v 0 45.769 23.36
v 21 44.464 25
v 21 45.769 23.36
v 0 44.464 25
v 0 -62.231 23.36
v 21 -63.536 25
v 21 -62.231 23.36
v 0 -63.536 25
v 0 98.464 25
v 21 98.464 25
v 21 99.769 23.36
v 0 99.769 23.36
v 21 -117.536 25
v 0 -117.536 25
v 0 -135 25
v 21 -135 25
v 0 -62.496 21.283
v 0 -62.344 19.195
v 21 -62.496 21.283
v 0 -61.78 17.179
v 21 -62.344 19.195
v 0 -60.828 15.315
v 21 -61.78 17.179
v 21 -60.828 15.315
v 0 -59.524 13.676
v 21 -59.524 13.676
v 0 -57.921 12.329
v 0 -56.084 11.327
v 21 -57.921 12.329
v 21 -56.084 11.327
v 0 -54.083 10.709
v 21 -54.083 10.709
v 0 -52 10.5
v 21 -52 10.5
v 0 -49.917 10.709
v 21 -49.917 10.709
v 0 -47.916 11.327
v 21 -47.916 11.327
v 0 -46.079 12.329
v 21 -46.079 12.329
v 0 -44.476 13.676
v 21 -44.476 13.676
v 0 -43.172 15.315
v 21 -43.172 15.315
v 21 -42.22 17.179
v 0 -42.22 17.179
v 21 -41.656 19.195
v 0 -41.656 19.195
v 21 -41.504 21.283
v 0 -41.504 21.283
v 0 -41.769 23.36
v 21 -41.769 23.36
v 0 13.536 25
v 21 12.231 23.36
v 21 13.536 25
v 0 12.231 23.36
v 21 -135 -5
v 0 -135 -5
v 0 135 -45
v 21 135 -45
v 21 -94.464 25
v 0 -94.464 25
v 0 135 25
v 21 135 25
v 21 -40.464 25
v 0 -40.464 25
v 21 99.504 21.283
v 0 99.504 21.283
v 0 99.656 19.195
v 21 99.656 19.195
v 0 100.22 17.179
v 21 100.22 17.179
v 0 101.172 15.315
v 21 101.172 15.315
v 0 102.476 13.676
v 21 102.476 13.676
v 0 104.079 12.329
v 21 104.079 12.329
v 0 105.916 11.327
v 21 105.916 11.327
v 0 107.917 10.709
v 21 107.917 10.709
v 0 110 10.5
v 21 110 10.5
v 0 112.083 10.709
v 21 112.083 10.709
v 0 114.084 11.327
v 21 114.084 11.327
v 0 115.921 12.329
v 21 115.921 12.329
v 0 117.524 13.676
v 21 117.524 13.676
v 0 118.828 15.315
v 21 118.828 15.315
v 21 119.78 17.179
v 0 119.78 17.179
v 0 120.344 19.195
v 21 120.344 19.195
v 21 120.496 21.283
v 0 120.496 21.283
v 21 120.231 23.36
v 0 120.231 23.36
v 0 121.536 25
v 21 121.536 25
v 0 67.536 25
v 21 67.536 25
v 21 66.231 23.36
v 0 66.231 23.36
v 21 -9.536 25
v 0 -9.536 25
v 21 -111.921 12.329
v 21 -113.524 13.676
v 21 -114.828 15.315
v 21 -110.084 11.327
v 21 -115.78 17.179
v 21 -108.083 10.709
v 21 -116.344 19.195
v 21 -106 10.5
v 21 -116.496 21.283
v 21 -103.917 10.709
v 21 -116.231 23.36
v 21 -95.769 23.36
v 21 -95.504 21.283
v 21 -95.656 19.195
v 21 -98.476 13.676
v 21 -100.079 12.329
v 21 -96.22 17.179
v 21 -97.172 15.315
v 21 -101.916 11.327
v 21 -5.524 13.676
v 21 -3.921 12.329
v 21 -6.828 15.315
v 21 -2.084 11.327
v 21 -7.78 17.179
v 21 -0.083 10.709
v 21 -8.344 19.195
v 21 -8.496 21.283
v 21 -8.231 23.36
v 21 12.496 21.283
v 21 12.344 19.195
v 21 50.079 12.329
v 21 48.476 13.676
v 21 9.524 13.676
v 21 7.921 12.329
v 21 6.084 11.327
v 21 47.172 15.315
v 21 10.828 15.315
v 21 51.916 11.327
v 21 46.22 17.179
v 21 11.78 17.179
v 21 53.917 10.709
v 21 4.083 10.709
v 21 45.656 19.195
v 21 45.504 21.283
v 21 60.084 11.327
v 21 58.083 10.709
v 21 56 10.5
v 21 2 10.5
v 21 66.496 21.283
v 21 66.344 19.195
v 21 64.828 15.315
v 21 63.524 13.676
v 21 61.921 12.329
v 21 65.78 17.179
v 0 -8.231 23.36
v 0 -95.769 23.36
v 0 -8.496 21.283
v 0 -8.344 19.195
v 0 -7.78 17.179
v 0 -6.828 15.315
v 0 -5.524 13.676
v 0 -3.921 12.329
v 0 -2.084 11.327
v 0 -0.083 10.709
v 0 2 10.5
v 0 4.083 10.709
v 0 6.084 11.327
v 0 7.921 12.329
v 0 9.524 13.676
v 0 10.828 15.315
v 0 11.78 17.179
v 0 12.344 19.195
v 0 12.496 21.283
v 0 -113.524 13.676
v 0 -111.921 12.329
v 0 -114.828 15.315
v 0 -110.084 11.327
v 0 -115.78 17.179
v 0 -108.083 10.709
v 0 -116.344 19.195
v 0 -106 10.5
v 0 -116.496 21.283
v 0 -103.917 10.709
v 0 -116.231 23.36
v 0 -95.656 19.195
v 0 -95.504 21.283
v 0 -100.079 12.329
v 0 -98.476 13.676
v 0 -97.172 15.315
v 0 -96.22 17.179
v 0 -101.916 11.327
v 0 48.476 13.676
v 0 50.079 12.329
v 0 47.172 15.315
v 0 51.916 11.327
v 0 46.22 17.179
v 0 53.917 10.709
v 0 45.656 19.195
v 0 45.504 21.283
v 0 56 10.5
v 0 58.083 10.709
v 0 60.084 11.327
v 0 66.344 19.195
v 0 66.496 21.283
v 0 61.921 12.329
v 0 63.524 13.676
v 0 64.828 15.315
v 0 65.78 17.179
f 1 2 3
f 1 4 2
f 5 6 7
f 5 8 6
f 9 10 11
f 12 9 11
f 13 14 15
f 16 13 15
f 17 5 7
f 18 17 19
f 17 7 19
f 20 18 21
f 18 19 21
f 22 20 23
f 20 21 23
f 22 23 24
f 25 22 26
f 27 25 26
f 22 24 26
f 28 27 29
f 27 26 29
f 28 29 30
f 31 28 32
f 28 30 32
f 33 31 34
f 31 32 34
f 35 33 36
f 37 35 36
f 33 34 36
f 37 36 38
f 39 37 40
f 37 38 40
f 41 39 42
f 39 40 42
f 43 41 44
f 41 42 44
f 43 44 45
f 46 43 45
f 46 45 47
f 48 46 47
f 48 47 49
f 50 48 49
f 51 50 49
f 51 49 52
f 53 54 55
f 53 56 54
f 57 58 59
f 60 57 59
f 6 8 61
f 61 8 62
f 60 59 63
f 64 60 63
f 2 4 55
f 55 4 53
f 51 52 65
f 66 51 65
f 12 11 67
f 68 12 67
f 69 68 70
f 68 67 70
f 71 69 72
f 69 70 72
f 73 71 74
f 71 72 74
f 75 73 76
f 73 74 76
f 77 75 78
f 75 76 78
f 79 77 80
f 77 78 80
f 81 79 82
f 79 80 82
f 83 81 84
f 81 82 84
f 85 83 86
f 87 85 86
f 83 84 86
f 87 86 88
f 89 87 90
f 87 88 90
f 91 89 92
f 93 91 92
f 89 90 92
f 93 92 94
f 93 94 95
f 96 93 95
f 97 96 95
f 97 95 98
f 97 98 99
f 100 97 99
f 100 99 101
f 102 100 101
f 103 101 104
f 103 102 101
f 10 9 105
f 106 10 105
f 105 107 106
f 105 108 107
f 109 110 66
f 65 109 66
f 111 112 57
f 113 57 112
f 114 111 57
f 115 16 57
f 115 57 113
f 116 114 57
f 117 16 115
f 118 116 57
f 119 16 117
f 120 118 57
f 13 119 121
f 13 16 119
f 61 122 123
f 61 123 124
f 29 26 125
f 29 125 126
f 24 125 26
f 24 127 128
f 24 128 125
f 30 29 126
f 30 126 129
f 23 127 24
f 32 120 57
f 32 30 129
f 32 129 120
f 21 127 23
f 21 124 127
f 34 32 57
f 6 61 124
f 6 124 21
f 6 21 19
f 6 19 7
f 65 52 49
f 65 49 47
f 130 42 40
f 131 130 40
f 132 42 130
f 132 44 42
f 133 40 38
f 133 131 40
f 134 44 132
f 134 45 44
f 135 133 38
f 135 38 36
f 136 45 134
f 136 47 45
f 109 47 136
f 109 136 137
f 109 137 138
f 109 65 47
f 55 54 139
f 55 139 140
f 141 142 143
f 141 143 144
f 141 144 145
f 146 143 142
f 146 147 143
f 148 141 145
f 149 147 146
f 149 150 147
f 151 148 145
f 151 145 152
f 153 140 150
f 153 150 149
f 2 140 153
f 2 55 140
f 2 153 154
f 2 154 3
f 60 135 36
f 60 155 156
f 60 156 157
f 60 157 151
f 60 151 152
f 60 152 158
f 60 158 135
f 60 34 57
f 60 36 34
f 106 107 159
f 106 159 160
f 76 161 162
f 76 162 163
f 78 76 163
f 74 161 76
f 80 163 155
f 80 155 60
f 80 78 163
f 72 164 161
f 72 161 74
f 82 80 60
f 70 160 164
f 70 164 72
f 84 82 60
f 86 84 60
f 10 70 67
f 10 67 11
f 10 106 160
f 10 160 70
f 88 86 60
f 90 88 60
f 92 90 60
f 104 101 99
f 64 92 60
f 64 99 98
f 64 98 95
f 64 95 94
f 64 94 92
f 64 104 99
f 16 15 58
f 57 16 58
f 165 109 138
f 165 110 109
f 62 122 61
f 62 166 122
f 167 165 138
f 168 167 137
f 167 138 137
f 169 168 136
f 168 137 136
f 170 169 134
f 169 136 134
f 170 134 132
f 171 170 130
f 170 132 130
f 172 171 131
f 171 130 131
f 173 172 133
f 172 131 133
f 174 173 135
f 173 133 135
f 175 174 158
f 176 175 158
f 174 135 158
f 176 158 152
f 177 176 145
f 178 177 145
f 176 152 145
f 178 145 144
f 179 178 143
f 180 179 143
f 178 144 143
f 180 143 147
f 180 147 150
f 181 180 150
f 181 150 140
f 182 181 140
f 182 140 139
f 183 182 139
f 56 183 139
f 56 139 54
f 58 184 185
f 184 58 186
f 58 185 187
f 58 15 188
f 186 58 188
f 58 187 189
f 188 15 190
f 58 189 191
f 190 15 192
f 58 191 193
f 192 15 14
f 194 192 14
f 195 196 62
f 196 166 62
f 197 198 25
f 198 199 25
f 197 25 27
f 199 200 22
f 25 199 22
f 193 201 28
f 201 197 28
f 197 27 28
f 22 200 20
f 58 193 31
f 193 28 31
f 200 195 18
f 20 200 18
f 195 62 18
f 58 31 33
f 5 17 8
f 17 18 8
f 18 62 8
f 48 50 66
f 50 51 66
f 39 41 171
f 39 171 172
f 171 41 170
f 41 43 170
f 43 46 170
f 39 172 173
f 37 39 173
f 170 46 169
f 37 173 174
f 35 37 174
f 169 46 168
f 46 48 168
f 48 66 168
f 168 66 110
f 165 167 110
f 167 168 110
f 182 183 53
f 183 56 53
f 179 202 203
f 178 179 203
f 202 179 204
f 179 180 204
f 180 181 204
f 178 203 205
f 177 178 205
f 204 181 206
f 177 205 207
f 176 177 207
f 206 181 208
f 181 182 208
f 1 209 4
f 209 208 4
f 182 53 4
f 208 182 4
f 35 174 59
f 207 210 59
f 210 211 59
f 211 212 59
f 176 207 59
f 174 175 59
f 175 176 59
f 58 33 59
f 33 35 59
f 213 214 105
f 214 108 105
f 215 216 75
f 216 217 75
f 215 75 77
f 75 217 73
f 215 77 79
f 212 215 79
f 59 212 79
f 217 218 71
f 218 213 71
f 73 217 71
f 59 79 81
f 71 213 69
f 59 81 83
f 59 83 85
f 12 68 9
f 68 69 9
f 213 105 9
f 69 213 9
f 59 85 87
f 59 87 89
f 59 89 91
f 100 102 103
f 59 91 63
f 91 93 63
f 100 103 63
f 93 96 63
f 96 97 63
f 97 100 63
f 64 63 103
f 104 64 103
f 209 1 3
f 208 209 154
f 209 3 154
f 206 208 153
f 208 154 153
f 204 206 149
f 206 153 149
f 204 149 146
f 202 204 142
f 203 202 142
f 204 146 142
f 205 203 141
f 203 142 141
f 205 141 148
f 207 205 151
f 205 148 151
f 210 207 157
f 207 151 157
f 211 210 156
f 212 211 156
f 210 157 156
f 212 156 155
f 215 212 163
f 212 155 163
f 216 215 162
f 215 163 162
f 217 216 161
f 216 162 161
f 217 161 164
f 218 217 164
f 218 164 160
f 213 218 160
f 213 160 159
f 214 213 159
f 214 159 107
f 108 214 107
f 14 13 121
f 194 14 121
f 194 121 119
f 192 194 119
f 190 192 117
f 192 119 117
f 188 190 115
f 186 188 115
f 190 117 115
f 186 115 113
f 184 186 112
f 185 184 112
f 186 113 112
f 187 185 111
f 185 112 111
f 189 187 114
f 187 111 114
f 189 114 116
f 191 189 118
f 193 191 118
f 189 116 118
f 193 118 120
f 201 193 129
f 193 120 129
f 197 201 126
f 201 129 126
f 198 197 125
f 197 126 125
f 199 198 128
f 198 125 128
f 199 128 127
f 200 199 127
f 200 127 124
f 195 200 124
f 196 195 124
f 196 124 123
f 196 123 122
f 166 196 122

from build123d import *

# Parameters (mm, degrees)
F1_DEPTH    = 21
F2_R        = 10.5
F3_DEPTH    = 25
F4_T1_DEPTH = 30.3938312155


# Not quite as in the source:
# - a fillet or chamfer that OpenCascade refuses, or shapes differently, is made with other operations: its cross-section is extruded or revolved along the edge and cut away or added


with BuildPart() as f1:
    # F0 (on Right) → F1 (new body)
    with BuildSketch(Plane.YZ):
        Polygon((-135, -5), (135, -45), (135, 25), (-135, 25), align=None)
    extrude(amount=F1_DEPTH)

    # F2 (on face) → F3 (cut)
    with BuildSketch(Plane.YZ.offset(21)):
        with Locations((110, 21)):
            Circle(F2_R)
        with Locations((56, 21)):
            Circle(F2_R)
        with Locations((2, 21)):
            Circle(F2_R)
        with Locations((-52, 21)):
            Circle(F2_R)
        with Locations((-106, 21)):
            Circle(F2_R)
    extrude(amount=-F3_DEPTH, mode=Mode.SUBTRACT)

    # F4: chamfer of 2 on 10 edges, made by hand

    # F4_s2 → F4_t1 (cut)
    with BuildSketch(Plane.YZ.offset(-4.6969156077)):
        with BuildLine():
            Line((-117.5859668407, 25.062603733), (-116.1815447498, 23.2973611197))
            Line((-116.1815447498, 23.2973611197), (-116.1425681704, 23.2883707774))
            ThreePointArc((-116.1425681704, 23.2883707774), (-115.9721143456, 24.157298763), (-115.6712601331, 24.9847619048))
            Line((-115.6712601331, 24.9847619048), (-115.7082439195, 25.04))
            ThreePointArc((-115.7082439195, 25.04), (-116.6471053801, 25.04), (-117.5859668407, 25.102603733))
            Line((-117.5859668407, 25.102603733), (-117.5859668407, 25.062603733))
        make_face()
        with BuildLine():
            Line((-95.8184552502, 23.2973611197), (-94.4140331593, 25.062603733))
            Line((-94.4140331593, 25.062603733), (-94.4140331593, 25.102603733))
            ThreePointArc((-94.4140331593, 25.102603733), (-95.3528946199, 25.04), (-96.2917560805, 25.04))
            Line((-96.2917560805, 25.04), (-96.3287398669, 24.9847619048))
            ThreePointArc((-96.3287398669, 24.9847619048), (-96.0278856544, 24.157298763), (-95.8574318296, 23.2883707774))
            Line((-95.8574318296, 23.2883707774), (-95.8184552502, 23.2973611197))
        make_face()
        with BuildLine():
            Line((-63.5859668407, 25.062603733), (-62.1815447498, 23.2973611197))
            Line((-62.1815447498, 23.2973611197), (-62.1425681704, 23.2883707774))
            ThreePointArc((-62.1425681704, 23.2883707774), (-61.9721143456, 24.157298763), (-61.6712601331, 24.9847619048))
            Line((-61.6712601331, 24.9847619048), (-61.7082439195, 25.04))
            ThreePointArc((-61.7082439195, 25.04), (-62.6471053801, 25.04), (-63.5859668407, 25.102603733))
            Line((-63.5859668407, 25.102603733), (-63.5859668407, 25.062603733))
        make_face()
        with BuildLine():
            Line((-41.8184552502, 23.2973611197), (-40.4140331593, 25.062603733))
            Line((-40.4140331593, 25.062603733), (-40.4140331593, 25.102603733))
            ThreePointArc((-40.4140331593, 25.102603733), (-41.3528946199, 25.04), (-42.2917560805, 25.04))
            Line((-42.2917560805, 25.04), (-42.3287398669, 24.9847619048))
            ThreePointArc((-42.3287398669, 24.9847619048), (-42.0278856544, 24.157298763), (-41.8574318296, 23.2883707774))
            Line((-41.8574318296, 23.2883707774), (-41.8184552502, 23.2973611197))
        make_face()
        with BuildLine():
            Line((-9.5859668407, 25.062603733), (-8.1815447498, 23.2973611197))
            Line((-8.1815447498, 23.2973611197), (-8.1425681704, 23.2883707774))
            ThreePointArc((-8.1425681704, 23.2883707774), (-7.9721143456, 24.157298763), (-7.6712601331, 24.9847619048))
            Line((-7.6712601331, 24.9847619048), (-7.7082439195, 25.04))
            ThreePointArc((-7.7082439195, 25.04), (-8.6471053801, 25.04), (-9.5859668407, 25.102603733))
            Line((-9.5859668407, 25.102603733), (-9.5859668407, 25.062603733))
        make_face()
        with BuildLine():
            Line((12.1815447498, 23.2973611197), (13.5859668407, 25.062603733))
            Line((13.5859668407, 25.062603733), (13.5859668407, 25.102603733))
            ThreePointArc((13.5859668407, 25.102603733), (12.6471053801, 25.04), (11.7082439195, 25.04))
            Line((11.7082439195, 25.04), (11.6712601331, 24.9847619048))
            ThreePointArc((11.6712601331, 24.9847619048), (11.9721143456, 24.157298763), (12.1425681704, 23.2883707774))
            Line((12.1425681704, 23.2883707774), (12.1815447498, 23.2973611197))
        make_face()
        with BuildLine():
            Line((44.4140331593, 25.062603733), (45.8184552502, 23.2973611197))
            Line((45.8184552502, 23.2973611197), (45.8574318296, 23.2883707774))
            ThreePointArc((45.8574318296, 23.2883707774), (46.0278856544, 24.157298763), (46.3287398669, 24.9847619048))
            Line((46.3287398669, 24.9847619048), (46.2917560805, 25.04))
            ThreePointArc((46.2917560805, 25.04), (45.3528946199, 25.04), (44.4140331593, 25.102603733))
            Line((44.4140331593, 25.102603733), (44.4140331593, 25.062603733))
        make_face()
        with BuildLine():
            Line((66.1815447498, 23.2973611197), (67.5859668407, 25.062603733))
            Line((67.5859668407, 25.062603733), (67.5859668407, 25.102603733))
            ThreePointArc((67.5859668407, 25.102603733), (66.6471053801, 25.04), (65.7082439195, 25.04))
            Line((65.7082439195, 25.04), (65.6712601331, 24.9847619048))
            ThreePointArc((65.6712601331, 24.9847619048), (65.9721143456, 24.157298763), (66.1425681704, 23.2883707774))
            Line((66.1425681704, 23.2883707774), (66.1815447498, 23.2973611197))
        make_face()
        with BuildLine():
            Line((98.4140331593, 25.062603733), (99.8184552502, 23.2973611197))
            Line((99.8184552502, 23.2973611197), (99.8574318296, 23.2883707774))
            ThreePointArc((99.8574318296, 23.2883707774), (100.0278856544, 24.157298763), (100.3287398669, 24.9847619048))
            Line((100.3287398669, 24.9847619048), (100.2917560805, 25.04))
            ThreePointArc((100.2917560805, 25.04), (99.3528946199, 25.04), (98.4140331593, 25.102603733))
            Line((98.4140331593, 25.102603733), (98.4140331593, 25.062603733))
        make_face()
        with BuildLine():
            Line((120.1815447498, 23.2973611197), (121.5859668407, 25.062603733))
            Line((121.5859668407, 25.062603733), (121.5859668407, 25.102603733))
            ThreePointArc((121.5859668407, 25.102603733), (120.6471053801, 25.04), (119.7082439195, 25.04))
            Line((119.7082439195, 25.04), (119.6712601331, 24.9847619048))
            ThreePointArc((119.6712601331, 24.9847619048), (119.9721143456, 24.157298763), (120.1425681704, 23.2883707774))
            Line((120.1425681704, 23.2883707774), (120.1815447498, 23.2973611197))
        make_face()
    extrude(amount=F4_T1_DEPTH, mode=Mode.SUBTRACT)


solid = f1.part
